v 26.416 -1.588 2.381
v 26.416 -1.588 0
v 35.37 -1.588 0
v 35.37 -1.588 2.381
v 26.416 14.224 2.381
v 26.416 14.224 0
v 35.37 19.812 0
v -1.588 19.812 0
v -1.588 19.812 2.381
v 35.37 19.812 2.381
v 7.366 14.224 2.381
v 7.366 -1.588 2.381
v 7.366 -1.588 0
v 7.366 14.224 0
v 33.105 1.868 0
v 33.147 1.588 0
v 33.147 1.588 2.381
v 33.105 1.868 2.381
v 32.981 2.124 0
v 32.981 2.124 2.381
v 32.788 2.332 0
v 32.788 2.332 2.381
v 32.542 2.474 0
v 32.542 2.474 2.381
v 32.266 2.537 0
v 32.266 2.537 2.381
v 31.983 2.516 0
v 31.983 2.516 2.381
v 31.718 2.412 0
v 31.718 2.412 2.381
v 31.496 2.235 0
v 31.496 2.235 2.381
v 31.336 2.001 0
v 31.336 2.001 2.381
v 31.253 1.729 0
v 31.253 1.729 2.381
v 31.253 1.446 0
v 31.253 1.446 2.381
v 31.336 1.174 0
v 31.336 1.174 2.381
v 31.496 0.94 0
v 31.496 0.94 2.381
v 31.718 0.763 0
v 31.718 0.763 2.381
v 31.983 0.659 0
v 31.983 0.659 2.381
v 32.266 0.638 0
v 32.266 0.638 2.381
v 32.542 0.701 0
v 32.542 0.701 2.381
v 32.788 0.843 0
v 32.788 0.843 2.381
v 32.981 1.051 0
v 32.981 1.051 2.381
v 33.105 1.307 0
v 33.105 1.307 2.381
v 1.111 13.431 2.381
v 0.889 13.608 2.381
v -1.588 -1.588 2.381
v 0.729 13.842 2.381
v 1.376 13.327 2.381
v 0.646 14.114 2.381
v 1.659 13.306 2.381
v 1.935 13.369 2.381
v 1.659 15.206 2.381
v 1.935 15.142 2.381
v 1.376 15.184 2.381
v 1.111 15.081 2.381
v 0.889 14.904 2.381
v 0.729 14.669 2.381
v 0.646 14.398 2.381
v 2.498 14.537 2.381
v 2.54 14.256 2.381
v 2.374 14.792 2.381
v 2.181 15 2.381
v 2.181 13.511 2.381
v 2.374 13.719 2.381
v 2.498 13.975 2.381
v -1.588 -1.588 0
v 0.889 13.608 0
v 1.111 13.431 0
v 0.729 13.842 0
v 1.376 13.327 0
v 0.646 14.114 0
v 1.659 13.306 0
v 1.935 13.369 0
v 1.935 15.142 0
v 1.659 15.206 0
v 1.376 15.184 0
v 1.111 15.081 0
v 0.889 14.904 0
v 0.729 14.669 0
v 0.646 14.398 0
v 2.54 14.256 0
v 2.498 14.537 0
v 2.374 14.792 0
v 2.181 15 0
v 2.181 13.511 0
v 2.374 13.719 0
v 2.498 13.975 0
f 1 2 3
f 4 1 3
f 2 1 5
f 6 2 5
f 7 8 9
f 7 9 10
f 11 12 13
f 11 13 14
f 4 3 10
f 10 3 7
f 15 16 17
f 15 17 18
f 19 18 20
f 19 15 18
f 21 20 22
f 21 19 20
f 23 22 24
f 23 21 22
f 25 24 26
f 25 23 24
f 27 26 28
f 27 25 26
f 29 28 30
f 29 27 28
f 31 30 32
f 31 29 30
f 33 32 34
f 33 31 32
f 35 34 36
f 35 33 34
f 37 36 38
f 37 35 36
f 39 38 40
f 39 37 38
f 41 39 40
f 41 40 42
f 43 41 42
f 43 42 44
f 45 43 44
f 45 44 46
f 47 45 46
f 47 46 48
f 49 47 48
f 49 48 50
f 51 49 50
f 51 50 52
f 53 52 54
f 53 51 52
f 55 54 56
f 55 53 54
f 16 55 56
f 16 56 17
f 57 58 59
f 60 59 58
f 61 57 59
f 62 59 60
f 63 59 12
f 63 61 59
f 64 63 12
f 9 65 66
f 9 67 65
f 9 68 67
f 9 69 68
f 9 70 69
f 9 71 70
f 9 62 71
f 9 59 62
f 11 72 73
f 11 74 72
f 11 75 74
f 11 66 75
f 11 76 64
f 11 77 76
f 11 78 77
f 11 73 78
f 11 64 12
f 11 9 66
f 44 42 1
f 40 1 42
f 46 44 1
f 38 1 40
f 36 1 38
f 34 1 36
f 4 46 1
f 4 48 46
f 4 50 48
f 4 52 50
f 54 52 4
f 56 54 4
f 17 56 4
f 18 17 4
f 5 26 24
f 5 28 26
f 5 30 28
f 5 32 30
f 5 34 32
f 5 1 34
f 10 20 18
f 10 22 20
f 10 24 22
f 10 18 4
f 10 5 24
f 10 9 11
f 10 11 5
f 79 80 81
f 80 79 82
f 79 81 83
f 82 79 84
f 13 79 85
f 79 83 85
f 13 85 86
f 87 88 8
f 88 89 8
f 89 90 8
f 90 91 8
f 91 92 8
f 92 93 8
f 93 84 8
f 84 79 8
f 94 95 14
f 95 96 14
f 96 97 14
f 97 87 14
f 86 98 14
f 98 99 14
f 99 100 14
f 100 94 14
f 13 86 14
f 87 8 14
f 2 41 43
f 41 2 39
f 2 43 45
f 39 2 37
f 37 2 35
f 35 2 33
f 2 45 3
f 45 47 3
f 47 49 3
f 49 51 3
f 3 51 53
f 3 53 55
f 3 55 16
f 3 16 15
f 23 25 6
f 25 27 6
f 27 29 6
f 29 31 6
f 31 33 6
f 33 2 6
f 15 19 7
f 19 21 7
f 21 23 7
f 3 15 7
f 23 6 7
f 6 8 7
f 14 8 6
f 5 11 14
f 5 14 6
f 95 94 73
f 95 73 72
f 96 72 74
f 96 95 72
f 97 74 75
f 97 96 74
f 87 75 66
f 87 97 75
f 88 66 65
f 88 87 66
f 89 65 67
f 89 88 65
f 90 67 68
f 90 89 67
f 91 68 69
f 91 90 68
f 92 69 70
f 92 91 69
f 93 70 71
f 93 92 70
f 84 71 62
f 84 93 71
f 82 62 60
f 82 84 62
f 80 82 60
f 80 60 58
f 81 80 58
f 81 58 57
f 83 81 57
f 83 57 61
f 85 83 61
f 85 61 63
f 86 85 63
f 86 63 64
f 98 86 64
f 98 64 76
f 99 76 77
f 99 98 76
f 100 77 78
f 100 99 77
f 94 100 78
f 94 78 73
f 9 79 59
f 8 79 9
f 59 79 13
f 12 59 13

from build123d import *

# Parameters (mm, degrees)
SKETCH1_W           = 36.957
SKETCH1_H           = 21.3995
SKETCH1_R           = 0.9525
BOSS_EXTRUDE1_DEPTH = 2.38125
CUT_EXTRUDE1_REACH  = 4.381
SKETCH2_W           = 19.05
SKETCH2_H           = 15.8115


with BuildPart() as part:
    # Sketch1 → Boss-Extrude1 (new body)
    with BuildSketch(Plane.XY):
        with Locations((16.891, 9.11225)):
            Rectangle(SKETCH1_W, SKETCH1_H)
        with Locations((1.5875, 14.25575)):
            Circle(SKETCH1_R, mode=Mode.SUBTRACT)
        with Locations((32.1945, 1.5875)):
            Circle(SKETCH1_R, mode=Mode.SUBTRACT)
    extrude(amount=BOSS_EXTRUDE1_DEPTH)

    # Sketch2 → Cut-Extrude1 (cut, up to next)
    with BuildSketch(Plane.XY.offset(2.38125), mode=Mode.PRIVATE) as cut_extrude1_sk1:
        with Locations((16.891, 6.31825)):
            Rectangle(SKETCH2_W, SKETCH2_H)
    cut_extrude1_tool1 = extrude(cut_extrude1_sk1.sketch, amount=-CUT_EXTRUDE1_REACH, mode=Mode.PRIVATE) & part.part
    add(cut_extrude1_tool1.solids().sort_by_distance((16.891, 6.31825, 2.38125))[0], mode=Mode.SUBTRACT)


solid = part.part
